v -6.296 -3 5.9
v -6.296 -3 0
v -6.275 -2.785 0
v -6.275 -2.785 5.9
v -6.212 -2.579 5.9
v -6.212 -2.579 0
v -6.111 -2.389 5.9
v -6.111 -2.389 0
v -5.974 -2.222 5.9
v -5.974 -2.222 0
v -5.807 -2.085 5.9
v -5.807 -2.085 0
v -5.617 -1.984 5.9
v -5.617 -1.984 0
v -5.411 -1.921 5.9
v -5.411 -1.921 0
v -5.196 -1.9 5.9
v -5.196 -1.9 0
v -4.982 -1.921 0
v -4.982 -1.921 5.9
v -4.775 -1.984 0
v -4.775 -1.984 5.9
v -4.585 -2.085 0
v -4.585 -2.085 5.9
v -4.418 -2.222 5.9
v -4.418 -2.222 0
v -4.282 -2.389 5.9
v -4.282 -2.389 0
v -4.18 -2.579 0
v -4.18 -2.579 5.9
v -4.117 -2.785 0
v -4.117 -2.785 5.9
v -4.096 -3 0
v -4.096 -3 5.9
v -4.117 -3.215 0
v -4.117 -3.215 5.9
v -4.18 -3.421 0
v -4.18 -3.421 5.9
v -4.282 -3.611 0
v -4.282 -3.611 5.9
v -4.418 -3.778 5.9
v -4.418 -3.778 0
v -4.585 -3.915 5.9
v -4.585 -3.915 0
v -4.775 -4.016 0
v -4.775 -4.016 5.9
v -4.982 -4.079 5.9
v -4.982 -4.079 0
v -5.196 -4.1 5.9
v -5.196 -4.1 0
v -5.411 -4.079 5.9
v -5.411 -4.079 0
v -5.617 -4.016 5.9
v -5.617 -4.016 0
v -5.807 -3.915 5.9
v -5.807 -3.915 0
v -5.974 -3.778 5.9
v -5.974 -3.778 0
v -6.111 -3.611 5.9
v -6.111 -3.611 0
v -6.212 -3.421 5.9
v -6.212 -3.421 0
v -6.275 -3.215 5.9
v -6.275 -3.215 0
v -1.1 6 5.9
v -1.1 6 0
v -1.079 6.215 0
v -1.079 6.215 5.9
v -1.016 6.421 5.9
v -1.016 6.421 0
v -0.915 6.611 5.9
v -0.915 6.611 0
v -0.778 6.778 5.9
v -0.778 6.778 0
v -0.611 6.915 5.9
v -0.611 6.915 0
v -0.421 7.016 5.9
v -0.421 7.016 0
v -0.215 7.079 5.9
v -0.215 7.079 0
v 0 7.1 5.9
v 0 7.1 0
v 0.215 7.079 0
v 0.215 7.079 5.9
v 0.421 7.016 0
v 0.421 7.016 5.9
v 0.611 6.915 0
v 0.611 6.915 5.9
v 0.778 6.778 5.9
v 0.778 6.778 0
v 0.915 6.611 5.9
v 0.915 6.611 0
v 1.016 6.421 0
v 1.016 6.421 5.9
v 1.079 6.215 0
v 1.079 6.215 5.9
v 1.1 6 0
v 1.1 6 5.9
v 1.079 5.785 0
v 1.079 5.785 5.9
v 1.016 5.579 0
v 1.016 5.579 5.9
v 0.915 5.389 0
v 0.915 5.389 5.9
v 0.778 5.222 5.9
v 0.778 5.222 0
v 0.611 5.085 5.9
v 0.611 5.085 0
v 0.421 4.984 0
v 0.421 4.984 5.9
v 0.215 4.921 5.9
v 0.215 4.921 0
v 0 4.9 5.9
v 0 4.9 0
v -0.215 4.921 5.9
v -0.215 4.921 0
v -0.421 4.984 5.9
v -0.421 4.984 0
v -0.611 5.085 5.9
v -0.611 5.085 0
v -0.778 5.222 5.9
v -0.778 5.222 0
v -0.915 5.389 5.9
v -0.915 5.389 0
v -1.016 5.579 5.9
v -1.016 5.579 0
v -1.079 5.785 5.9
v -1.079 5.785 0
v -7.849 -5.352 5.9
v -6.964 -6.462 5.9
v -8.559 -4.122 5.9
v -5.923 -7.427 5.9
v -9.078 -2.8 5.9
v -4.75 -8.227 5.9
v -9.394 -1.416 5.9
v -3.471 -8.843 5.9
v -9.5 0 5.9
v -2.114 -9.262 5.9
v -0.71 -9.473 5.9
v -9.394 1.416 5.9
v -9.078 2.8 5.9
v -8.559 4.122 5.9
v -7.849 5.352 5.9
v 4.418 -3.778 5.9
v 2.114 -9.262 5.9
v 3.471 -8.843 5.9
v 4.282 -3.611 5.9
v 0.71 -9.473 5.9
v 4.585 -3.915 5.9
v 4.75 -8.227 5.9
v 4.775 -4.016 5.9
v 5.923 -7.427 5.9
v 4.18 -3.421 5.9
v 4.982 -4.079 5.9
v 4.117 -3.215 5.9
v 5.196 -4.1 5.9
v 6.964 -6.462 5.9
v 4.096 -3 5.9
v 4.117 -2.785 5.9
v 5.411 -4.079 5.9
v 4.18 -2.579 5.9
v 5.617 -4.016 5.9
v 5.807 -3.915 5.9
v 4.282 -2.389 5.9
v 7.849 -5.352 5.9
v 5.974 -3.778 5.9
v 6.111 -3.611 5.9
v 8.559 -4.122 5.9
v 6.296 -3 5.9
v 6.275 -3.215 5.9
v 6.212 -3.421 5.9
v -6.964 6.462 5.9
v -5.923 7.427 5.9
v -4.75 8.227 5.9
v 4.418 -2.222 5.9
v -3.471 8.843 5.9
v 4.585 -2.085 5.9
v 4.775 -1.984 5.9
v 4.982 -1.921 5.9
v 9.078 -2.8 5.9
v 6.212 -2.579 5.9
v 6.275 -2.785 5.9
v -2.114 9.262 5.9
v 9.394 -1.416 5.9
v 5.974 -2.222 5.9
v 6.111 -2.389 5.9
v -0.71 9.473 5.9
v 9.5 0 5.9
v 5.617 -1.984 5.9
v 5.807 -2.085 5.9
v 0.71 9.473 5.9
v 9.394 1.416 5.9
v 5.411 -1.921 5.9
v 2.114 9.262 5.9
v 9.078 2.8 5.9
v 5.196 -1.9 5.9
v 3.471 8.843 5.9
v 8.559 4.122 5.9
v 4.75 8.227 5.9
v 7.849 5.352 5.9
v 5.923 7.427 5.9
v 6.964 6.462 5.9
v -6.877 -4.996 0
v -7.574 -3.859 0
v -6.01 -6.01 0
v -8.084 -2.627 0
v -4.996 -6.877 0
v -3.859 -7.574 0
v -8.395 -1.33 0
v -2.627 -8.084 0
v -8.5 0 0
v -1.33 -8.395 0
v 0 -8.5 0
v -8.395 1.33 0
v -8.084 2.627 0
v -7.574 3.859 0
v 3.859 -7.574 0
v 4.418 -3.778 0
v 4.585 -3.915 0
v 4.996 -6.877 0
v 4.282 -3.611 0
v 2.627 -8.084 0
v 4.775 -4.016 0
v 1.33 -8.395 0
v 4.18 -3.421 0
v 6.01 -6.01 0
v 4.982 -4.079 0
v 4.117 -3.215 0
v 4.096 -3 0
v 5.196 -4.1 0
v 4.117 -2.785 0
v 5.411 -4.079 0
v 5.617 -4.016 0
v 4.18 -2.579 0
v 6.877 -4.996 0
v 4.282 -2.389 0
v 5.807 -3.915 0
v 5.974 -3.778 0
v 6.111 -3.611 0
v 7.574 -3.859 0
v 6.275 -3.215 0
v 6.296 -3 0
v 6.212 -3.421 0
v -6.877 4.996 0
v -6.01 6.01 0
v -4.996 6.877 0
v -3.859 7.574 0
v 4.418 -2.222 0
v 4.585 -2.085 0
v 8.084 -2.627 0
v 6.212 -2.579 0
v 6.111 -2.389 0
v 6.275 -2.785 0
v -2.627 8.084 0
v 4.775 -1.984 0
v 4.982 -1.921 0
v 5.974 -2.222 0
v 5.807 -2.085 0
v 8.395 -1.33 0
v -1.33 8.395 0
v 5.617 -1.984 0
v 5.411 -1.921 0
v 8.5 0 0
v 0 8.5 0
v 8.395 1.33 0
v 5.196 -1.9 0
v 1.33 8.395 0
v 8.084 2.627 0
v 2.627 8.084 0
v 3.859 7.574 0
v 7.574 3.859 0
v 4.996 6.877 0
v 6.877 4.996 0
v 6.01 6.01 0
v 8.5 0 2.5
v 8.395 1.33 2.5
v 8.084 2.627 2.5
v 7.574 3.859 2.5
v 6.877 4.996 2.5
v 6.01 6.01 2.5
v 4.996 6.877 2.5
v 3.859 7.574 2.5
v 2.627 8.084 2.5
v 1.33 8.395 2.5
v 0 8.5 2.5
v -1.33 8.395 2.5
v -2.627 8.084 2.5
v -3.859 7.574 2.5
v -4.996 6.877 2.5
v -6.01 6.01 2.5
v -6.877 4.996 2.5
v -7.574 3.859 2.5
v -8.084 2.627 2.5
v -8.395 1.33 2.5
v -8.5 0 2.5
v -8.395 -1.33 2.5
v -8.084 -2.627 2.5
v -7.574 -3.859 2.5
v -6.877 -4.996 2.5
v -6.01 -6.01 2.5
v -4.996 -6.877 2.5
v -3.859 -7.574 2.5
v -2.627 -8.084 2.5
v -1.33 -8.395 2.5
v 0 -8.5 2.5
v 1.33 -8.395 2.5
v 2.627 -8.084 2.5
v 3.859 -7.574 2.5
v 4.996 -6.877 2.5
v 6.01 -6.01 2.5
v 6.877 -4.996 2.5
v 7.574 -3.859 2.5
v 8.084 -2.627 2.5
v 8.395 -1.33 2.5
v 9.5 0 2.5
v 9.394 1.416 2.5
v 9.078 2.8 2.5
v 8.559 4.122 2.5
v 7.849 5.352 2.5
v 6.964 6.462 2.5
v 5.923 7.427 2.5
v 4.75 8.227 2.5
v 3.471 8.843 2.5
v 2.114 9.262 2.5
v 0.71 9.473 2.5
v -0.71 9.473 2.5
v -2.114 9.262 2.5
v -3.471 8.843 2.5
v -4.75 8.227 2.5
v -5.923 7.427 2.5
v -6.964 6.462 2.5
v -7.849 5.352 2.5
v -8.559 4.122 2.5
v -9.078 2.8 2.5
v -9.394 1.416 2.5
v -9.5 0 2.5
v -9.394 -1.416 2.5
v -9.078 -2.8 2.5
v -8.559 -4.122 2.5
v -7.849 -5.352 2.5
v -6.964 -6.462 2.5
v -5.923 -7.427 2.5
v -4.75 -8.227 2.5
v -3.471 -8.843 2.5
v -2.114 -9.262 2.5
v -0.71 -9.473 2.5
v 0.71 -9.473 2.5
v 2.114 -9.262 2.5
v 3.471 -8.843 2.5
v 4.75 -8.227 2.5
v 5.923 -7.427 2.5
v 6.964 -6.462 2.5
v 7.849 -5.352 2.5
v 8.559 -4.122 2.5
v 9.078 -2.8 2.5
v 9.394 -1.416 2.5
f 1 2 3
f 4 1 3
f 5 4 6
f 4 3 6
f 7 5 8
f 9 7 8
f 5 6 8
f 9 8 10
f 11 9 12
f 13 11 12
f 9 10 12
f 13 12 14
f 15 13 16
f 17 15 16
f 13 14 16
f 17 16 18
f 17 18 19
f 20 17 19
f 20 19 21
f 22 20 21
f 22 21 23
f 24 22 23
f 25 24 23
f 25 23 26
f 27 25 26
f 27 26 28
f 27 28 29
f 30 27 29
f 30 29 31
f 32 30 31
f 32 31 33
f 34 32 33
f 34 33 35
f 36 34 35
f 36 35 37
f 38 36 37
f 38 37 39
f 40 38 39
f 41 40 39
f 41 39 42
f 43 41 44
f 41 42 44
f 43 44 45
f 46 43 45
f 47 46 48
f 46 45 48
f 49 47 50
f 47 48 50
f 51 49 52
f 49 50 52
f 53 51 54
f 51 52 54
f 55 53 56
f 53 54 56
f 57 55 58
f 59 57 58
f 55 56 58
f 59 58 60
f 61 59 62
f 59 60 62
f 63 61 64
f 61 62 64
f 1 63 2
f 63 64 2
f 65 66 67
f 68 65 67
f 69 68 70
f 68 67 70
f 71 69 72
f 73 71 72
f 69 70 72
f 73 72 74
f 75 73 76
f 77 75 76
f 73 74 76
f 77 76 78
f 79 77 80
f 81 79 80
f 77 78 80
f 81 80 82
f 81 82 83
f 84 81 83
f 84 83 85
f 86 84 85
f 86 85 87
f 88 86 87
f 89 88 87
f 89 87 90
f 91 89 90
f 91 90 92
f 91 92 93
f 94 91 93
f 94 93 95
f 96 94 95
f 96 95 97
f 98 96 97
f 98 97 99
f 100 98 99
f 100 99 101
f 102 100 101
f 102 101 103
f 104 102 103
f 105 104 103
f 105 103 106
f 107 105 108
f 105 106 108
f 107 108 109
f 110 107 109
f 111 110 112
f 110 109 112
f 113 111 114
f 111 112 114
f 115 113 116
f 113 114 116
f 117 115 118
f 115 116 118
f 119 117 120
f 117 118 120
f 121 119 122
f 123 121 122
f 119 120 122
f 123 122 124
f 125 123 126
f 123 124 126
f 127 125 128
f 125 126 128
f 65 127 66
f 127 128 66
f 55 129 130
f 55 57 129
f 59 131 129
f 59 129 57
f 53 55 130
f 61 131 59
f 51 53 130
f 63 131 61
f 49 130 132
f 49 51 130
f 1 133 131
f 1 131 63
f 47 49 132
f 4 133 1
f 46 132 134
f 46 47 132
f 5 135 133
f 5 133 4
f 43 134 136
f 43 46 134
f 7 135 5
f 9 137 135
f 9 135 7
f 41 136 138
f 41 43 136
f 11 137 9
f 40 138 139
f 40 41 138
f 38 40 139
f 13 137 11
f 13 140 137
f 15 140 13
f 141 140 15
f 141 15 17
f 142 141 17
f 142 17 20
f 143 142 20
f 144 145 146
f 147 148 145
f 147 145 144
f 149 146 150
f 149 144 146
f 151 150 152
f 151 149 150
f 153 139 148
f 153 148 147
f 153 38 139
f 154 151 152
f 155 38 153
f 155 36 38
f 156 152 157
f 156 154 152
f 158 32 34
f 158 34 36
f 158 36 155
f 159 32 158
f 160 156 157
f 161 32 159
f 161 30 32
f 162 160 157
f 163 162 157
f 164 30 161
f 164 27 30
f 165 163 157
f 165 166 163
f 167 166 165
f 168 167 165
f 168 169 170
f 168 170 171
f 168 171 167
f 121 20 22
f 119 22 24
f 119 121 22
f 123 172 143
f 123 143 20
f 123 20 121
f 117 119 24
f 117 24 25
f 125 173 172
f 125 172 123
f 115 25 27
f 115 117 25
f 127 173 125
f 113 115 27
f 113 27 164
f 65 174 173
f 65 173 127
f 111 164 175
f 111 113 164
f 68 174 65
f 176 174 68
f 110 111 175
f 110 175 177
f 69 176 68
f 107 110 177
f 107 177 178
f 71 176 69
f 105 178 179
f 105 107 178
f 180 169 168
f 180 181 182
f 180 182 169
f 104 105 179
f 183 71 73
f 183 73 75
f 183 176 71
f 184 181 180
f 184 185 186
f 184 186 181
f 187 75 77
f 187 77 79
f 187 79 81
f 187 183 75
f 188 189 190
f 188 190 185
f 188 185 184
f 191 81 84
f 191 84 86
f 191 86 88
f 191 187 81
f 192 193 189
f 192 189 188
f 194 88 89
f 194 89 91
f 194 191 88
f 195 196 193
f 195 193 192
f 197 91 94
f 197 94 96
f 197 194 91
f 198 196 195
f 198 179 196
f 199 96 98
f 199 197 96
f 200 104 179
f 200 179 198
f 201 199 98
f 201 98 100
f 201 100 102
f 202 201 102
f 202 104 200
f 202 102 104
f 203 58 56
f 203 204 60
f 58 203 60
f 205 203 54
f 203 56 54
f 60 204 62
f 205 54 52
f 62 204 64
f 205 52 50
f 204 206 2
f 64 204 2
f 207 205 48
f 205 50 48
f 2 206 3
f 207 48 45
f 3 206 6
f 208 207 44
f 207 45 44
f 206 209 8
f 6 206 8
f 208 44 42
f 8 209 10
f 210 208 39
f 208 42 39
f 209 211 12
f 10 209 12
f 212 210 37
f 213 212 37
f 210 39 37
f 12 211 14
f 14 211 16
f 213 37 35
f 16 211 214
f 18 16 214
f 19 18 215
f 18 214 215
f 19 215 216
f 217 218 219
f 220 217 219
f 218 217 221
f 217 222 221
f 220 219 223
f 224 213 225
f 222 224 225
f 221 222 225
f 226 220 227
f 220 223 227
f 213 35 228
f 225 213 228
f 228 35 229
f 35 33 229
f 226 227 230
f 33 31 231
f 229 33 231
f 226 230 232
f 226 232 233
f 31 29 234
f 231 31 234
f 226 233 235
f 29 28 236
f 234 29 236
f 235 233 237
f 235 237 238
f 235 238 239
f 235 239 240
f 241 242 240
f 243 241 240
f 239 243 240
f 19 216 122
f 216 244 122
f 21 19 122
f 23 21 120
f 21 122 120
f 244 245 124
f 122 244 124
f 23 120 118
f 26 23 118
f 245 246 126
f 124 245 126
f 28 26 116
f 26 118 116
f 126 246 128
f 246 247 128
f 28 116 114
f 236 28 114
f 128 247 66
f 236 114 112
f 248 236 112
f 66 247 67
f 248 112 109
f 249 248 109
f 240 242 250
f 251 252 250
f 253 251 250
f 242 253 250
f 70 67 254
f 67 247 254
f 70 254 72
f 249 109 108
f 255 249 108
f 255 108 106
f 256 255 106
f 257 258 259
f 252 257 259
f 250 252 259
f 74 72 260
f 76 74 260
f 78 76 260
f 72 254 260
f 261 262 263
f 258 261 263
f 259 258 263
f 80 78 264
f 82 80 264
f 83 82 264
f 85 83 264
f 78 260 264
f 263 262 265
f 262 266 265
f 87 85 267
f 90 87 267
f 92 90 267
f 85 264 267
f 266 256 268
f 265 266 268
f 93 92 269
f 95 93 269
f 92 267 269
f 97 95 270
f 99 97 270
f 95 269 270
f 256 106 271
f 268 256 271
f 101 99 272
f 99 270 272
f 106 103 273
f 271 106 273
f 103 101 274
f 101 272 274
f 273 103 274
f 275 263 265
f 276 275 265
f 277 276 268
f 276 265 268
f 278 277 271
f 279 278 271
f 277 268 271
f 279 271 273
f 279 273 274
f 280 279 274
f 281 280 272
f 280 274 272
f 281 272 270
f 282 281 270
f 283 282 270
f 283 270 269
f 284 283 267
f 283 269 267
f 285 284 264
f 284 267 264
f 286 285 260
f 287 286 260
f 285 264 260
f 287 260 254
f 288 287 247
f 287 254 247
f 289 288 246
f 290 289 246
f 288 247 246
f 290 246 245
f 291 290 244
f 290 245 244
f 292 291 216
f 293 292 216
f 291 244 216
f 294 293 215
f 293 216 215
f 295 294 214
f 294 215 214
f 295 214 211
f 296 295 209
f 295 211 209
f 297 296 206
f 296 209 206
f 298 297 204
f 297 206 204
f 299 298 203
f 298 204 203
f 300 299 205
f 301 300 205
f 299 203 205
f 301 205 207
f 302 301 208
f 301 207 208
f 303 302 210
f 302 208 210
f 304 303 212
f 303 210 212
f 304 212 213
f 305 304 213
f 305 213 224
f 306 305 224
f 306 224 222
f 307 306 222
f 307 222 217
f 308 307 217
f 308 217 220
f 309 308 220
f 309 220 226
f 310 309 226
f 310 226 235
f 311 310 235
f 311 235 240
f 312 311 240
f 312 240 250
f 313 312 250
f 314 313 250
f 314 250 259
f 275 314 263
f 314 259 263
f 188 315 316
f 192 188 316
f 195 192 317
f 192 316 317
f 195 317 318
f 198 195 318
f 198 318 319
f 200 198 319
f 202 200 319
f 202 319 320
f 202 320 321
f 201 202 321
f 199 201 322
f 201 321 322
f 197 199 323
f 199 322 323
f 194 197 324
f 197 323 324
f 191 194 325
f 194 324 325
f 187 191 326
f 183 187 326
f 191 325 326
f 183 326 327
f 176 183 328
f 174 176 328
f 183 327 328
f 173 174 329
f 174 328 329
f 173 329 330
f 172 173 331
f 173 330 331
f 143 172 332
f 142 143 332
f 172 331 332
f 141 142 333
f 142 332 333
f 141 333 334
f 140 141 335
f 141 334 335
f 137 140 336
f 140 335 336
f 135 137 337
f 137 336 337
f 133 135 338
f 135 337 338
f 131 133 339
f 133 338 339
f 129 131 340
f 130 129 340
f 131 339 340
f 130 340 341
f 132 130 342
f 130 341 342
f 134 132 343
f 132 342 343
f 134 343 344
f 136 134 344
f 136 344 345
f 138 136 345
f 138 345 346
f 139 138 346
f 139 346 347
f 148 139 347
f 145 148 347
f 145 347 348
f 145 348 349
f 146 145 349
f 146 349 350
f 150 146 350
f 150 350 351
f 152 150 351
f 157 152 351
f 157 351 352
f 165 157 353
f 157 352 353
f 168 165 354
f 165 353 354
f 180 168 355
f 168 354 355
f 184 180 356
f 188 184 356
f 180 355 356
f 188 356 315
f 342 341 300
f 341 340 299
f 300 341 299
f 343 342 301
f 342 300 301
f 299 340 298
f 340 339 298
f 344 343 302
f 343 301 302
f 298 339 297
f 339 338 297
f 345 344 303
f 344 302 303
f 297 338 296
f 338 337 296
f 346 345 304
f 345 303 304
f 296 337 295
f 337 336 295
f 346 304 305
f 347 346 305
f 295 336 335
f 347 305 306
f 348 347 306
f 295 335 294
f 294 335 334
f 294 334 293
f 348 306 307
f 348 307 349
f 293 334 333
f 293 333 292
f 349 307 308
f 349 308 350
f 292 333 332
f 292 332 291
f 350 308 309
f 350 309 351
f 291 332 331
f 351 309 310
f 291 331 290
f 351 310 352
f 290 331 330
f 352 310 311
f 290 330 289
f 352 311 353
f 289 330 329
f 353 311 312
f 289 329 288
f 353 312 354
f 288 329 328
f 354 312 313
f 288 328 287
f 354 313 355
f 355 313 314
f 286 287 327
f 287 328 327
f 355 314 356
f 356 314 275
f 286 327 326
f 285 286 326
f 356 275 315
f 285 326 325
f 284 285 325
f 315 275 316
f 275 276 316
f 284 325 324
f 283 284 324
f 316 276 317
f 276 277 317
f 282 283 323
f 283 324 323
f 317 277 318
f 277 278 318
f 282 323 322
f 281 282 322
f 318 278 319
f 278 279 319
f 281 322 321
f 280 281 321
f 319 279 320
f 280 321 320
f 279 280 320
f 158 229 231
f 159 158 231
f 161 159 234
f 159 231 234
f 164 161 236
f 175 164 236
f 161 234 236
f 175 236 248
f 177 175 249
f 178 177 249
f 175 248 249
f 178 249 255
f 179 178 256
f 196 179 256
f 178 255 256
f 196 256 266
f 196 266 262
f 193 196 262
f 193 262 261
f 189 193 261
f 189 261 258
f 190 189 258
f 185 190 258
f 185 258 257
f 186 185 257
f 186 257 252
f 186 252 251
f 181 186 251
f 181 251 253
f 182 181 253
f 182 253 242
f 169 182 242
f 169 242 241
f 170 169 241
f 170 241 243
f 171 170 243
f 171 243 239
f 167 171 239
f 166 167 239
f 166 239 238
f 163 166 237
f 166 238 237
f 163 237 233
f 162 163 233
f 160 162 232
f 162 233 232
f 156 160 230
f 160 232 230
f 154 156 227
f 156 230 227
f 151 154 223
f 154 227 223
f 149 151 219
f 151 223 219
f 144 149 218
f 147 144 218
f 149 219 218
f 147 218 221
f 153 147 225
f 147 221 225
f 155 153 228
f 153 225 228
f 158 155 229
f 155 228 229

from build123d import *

# Parameters (mm, degrees)
SKETCH_1_R          = 8.5
EXTRUDE_1_DEPTH     = 2.5
SKETCH_2_R          = 9.5
EXTRUDE_2_DEPTH     = 3.4
SKETCH_3_R          = 1.1
CUT_EXTRUDE_1_DEPTH = 15.673445403


with BuildPart() as part:
    # ｽｹｯﾁ1 → ﾎﾞｽ - 押し出し1 (new body)
    with BuildSketch(Plane.XY):
        Circle(SKETCH_1_R)
    extrude(amount=EXTRUDE_1_DEPTH)

    # ｽｹｯﾁ2 → ﾎﾞｽ - 押し出し2 (add)
    with BuildSketch(Plane.XY.offset(2.5)):
        Circle(SKETCH_2_R)
    extrude(amount=EXTRUDE_2_DEPTH)

    # ｽｹｯﾁ3 → ｶｯﾄ - 押し出し1 (cut, through all)
    with BuildSketch(Plane(origin=(0, 0, 0), x_dir=(-1, 0, 0), z_dir=(0, 0, -1))):
        with Locations((0, 6)):
            Circle(SKETCH_3_R)
        with Locations((5.196152423, -3)):
            Circle(SKETCH_3_R)
        with Locations((-5.196152423, -3)):
            Circle(SKETCH_3_R)
    extrude(amount=-CUT_EXTRUDE_1_DEPTH, mode=Mode.SUBTRACT)


solid = part.part
